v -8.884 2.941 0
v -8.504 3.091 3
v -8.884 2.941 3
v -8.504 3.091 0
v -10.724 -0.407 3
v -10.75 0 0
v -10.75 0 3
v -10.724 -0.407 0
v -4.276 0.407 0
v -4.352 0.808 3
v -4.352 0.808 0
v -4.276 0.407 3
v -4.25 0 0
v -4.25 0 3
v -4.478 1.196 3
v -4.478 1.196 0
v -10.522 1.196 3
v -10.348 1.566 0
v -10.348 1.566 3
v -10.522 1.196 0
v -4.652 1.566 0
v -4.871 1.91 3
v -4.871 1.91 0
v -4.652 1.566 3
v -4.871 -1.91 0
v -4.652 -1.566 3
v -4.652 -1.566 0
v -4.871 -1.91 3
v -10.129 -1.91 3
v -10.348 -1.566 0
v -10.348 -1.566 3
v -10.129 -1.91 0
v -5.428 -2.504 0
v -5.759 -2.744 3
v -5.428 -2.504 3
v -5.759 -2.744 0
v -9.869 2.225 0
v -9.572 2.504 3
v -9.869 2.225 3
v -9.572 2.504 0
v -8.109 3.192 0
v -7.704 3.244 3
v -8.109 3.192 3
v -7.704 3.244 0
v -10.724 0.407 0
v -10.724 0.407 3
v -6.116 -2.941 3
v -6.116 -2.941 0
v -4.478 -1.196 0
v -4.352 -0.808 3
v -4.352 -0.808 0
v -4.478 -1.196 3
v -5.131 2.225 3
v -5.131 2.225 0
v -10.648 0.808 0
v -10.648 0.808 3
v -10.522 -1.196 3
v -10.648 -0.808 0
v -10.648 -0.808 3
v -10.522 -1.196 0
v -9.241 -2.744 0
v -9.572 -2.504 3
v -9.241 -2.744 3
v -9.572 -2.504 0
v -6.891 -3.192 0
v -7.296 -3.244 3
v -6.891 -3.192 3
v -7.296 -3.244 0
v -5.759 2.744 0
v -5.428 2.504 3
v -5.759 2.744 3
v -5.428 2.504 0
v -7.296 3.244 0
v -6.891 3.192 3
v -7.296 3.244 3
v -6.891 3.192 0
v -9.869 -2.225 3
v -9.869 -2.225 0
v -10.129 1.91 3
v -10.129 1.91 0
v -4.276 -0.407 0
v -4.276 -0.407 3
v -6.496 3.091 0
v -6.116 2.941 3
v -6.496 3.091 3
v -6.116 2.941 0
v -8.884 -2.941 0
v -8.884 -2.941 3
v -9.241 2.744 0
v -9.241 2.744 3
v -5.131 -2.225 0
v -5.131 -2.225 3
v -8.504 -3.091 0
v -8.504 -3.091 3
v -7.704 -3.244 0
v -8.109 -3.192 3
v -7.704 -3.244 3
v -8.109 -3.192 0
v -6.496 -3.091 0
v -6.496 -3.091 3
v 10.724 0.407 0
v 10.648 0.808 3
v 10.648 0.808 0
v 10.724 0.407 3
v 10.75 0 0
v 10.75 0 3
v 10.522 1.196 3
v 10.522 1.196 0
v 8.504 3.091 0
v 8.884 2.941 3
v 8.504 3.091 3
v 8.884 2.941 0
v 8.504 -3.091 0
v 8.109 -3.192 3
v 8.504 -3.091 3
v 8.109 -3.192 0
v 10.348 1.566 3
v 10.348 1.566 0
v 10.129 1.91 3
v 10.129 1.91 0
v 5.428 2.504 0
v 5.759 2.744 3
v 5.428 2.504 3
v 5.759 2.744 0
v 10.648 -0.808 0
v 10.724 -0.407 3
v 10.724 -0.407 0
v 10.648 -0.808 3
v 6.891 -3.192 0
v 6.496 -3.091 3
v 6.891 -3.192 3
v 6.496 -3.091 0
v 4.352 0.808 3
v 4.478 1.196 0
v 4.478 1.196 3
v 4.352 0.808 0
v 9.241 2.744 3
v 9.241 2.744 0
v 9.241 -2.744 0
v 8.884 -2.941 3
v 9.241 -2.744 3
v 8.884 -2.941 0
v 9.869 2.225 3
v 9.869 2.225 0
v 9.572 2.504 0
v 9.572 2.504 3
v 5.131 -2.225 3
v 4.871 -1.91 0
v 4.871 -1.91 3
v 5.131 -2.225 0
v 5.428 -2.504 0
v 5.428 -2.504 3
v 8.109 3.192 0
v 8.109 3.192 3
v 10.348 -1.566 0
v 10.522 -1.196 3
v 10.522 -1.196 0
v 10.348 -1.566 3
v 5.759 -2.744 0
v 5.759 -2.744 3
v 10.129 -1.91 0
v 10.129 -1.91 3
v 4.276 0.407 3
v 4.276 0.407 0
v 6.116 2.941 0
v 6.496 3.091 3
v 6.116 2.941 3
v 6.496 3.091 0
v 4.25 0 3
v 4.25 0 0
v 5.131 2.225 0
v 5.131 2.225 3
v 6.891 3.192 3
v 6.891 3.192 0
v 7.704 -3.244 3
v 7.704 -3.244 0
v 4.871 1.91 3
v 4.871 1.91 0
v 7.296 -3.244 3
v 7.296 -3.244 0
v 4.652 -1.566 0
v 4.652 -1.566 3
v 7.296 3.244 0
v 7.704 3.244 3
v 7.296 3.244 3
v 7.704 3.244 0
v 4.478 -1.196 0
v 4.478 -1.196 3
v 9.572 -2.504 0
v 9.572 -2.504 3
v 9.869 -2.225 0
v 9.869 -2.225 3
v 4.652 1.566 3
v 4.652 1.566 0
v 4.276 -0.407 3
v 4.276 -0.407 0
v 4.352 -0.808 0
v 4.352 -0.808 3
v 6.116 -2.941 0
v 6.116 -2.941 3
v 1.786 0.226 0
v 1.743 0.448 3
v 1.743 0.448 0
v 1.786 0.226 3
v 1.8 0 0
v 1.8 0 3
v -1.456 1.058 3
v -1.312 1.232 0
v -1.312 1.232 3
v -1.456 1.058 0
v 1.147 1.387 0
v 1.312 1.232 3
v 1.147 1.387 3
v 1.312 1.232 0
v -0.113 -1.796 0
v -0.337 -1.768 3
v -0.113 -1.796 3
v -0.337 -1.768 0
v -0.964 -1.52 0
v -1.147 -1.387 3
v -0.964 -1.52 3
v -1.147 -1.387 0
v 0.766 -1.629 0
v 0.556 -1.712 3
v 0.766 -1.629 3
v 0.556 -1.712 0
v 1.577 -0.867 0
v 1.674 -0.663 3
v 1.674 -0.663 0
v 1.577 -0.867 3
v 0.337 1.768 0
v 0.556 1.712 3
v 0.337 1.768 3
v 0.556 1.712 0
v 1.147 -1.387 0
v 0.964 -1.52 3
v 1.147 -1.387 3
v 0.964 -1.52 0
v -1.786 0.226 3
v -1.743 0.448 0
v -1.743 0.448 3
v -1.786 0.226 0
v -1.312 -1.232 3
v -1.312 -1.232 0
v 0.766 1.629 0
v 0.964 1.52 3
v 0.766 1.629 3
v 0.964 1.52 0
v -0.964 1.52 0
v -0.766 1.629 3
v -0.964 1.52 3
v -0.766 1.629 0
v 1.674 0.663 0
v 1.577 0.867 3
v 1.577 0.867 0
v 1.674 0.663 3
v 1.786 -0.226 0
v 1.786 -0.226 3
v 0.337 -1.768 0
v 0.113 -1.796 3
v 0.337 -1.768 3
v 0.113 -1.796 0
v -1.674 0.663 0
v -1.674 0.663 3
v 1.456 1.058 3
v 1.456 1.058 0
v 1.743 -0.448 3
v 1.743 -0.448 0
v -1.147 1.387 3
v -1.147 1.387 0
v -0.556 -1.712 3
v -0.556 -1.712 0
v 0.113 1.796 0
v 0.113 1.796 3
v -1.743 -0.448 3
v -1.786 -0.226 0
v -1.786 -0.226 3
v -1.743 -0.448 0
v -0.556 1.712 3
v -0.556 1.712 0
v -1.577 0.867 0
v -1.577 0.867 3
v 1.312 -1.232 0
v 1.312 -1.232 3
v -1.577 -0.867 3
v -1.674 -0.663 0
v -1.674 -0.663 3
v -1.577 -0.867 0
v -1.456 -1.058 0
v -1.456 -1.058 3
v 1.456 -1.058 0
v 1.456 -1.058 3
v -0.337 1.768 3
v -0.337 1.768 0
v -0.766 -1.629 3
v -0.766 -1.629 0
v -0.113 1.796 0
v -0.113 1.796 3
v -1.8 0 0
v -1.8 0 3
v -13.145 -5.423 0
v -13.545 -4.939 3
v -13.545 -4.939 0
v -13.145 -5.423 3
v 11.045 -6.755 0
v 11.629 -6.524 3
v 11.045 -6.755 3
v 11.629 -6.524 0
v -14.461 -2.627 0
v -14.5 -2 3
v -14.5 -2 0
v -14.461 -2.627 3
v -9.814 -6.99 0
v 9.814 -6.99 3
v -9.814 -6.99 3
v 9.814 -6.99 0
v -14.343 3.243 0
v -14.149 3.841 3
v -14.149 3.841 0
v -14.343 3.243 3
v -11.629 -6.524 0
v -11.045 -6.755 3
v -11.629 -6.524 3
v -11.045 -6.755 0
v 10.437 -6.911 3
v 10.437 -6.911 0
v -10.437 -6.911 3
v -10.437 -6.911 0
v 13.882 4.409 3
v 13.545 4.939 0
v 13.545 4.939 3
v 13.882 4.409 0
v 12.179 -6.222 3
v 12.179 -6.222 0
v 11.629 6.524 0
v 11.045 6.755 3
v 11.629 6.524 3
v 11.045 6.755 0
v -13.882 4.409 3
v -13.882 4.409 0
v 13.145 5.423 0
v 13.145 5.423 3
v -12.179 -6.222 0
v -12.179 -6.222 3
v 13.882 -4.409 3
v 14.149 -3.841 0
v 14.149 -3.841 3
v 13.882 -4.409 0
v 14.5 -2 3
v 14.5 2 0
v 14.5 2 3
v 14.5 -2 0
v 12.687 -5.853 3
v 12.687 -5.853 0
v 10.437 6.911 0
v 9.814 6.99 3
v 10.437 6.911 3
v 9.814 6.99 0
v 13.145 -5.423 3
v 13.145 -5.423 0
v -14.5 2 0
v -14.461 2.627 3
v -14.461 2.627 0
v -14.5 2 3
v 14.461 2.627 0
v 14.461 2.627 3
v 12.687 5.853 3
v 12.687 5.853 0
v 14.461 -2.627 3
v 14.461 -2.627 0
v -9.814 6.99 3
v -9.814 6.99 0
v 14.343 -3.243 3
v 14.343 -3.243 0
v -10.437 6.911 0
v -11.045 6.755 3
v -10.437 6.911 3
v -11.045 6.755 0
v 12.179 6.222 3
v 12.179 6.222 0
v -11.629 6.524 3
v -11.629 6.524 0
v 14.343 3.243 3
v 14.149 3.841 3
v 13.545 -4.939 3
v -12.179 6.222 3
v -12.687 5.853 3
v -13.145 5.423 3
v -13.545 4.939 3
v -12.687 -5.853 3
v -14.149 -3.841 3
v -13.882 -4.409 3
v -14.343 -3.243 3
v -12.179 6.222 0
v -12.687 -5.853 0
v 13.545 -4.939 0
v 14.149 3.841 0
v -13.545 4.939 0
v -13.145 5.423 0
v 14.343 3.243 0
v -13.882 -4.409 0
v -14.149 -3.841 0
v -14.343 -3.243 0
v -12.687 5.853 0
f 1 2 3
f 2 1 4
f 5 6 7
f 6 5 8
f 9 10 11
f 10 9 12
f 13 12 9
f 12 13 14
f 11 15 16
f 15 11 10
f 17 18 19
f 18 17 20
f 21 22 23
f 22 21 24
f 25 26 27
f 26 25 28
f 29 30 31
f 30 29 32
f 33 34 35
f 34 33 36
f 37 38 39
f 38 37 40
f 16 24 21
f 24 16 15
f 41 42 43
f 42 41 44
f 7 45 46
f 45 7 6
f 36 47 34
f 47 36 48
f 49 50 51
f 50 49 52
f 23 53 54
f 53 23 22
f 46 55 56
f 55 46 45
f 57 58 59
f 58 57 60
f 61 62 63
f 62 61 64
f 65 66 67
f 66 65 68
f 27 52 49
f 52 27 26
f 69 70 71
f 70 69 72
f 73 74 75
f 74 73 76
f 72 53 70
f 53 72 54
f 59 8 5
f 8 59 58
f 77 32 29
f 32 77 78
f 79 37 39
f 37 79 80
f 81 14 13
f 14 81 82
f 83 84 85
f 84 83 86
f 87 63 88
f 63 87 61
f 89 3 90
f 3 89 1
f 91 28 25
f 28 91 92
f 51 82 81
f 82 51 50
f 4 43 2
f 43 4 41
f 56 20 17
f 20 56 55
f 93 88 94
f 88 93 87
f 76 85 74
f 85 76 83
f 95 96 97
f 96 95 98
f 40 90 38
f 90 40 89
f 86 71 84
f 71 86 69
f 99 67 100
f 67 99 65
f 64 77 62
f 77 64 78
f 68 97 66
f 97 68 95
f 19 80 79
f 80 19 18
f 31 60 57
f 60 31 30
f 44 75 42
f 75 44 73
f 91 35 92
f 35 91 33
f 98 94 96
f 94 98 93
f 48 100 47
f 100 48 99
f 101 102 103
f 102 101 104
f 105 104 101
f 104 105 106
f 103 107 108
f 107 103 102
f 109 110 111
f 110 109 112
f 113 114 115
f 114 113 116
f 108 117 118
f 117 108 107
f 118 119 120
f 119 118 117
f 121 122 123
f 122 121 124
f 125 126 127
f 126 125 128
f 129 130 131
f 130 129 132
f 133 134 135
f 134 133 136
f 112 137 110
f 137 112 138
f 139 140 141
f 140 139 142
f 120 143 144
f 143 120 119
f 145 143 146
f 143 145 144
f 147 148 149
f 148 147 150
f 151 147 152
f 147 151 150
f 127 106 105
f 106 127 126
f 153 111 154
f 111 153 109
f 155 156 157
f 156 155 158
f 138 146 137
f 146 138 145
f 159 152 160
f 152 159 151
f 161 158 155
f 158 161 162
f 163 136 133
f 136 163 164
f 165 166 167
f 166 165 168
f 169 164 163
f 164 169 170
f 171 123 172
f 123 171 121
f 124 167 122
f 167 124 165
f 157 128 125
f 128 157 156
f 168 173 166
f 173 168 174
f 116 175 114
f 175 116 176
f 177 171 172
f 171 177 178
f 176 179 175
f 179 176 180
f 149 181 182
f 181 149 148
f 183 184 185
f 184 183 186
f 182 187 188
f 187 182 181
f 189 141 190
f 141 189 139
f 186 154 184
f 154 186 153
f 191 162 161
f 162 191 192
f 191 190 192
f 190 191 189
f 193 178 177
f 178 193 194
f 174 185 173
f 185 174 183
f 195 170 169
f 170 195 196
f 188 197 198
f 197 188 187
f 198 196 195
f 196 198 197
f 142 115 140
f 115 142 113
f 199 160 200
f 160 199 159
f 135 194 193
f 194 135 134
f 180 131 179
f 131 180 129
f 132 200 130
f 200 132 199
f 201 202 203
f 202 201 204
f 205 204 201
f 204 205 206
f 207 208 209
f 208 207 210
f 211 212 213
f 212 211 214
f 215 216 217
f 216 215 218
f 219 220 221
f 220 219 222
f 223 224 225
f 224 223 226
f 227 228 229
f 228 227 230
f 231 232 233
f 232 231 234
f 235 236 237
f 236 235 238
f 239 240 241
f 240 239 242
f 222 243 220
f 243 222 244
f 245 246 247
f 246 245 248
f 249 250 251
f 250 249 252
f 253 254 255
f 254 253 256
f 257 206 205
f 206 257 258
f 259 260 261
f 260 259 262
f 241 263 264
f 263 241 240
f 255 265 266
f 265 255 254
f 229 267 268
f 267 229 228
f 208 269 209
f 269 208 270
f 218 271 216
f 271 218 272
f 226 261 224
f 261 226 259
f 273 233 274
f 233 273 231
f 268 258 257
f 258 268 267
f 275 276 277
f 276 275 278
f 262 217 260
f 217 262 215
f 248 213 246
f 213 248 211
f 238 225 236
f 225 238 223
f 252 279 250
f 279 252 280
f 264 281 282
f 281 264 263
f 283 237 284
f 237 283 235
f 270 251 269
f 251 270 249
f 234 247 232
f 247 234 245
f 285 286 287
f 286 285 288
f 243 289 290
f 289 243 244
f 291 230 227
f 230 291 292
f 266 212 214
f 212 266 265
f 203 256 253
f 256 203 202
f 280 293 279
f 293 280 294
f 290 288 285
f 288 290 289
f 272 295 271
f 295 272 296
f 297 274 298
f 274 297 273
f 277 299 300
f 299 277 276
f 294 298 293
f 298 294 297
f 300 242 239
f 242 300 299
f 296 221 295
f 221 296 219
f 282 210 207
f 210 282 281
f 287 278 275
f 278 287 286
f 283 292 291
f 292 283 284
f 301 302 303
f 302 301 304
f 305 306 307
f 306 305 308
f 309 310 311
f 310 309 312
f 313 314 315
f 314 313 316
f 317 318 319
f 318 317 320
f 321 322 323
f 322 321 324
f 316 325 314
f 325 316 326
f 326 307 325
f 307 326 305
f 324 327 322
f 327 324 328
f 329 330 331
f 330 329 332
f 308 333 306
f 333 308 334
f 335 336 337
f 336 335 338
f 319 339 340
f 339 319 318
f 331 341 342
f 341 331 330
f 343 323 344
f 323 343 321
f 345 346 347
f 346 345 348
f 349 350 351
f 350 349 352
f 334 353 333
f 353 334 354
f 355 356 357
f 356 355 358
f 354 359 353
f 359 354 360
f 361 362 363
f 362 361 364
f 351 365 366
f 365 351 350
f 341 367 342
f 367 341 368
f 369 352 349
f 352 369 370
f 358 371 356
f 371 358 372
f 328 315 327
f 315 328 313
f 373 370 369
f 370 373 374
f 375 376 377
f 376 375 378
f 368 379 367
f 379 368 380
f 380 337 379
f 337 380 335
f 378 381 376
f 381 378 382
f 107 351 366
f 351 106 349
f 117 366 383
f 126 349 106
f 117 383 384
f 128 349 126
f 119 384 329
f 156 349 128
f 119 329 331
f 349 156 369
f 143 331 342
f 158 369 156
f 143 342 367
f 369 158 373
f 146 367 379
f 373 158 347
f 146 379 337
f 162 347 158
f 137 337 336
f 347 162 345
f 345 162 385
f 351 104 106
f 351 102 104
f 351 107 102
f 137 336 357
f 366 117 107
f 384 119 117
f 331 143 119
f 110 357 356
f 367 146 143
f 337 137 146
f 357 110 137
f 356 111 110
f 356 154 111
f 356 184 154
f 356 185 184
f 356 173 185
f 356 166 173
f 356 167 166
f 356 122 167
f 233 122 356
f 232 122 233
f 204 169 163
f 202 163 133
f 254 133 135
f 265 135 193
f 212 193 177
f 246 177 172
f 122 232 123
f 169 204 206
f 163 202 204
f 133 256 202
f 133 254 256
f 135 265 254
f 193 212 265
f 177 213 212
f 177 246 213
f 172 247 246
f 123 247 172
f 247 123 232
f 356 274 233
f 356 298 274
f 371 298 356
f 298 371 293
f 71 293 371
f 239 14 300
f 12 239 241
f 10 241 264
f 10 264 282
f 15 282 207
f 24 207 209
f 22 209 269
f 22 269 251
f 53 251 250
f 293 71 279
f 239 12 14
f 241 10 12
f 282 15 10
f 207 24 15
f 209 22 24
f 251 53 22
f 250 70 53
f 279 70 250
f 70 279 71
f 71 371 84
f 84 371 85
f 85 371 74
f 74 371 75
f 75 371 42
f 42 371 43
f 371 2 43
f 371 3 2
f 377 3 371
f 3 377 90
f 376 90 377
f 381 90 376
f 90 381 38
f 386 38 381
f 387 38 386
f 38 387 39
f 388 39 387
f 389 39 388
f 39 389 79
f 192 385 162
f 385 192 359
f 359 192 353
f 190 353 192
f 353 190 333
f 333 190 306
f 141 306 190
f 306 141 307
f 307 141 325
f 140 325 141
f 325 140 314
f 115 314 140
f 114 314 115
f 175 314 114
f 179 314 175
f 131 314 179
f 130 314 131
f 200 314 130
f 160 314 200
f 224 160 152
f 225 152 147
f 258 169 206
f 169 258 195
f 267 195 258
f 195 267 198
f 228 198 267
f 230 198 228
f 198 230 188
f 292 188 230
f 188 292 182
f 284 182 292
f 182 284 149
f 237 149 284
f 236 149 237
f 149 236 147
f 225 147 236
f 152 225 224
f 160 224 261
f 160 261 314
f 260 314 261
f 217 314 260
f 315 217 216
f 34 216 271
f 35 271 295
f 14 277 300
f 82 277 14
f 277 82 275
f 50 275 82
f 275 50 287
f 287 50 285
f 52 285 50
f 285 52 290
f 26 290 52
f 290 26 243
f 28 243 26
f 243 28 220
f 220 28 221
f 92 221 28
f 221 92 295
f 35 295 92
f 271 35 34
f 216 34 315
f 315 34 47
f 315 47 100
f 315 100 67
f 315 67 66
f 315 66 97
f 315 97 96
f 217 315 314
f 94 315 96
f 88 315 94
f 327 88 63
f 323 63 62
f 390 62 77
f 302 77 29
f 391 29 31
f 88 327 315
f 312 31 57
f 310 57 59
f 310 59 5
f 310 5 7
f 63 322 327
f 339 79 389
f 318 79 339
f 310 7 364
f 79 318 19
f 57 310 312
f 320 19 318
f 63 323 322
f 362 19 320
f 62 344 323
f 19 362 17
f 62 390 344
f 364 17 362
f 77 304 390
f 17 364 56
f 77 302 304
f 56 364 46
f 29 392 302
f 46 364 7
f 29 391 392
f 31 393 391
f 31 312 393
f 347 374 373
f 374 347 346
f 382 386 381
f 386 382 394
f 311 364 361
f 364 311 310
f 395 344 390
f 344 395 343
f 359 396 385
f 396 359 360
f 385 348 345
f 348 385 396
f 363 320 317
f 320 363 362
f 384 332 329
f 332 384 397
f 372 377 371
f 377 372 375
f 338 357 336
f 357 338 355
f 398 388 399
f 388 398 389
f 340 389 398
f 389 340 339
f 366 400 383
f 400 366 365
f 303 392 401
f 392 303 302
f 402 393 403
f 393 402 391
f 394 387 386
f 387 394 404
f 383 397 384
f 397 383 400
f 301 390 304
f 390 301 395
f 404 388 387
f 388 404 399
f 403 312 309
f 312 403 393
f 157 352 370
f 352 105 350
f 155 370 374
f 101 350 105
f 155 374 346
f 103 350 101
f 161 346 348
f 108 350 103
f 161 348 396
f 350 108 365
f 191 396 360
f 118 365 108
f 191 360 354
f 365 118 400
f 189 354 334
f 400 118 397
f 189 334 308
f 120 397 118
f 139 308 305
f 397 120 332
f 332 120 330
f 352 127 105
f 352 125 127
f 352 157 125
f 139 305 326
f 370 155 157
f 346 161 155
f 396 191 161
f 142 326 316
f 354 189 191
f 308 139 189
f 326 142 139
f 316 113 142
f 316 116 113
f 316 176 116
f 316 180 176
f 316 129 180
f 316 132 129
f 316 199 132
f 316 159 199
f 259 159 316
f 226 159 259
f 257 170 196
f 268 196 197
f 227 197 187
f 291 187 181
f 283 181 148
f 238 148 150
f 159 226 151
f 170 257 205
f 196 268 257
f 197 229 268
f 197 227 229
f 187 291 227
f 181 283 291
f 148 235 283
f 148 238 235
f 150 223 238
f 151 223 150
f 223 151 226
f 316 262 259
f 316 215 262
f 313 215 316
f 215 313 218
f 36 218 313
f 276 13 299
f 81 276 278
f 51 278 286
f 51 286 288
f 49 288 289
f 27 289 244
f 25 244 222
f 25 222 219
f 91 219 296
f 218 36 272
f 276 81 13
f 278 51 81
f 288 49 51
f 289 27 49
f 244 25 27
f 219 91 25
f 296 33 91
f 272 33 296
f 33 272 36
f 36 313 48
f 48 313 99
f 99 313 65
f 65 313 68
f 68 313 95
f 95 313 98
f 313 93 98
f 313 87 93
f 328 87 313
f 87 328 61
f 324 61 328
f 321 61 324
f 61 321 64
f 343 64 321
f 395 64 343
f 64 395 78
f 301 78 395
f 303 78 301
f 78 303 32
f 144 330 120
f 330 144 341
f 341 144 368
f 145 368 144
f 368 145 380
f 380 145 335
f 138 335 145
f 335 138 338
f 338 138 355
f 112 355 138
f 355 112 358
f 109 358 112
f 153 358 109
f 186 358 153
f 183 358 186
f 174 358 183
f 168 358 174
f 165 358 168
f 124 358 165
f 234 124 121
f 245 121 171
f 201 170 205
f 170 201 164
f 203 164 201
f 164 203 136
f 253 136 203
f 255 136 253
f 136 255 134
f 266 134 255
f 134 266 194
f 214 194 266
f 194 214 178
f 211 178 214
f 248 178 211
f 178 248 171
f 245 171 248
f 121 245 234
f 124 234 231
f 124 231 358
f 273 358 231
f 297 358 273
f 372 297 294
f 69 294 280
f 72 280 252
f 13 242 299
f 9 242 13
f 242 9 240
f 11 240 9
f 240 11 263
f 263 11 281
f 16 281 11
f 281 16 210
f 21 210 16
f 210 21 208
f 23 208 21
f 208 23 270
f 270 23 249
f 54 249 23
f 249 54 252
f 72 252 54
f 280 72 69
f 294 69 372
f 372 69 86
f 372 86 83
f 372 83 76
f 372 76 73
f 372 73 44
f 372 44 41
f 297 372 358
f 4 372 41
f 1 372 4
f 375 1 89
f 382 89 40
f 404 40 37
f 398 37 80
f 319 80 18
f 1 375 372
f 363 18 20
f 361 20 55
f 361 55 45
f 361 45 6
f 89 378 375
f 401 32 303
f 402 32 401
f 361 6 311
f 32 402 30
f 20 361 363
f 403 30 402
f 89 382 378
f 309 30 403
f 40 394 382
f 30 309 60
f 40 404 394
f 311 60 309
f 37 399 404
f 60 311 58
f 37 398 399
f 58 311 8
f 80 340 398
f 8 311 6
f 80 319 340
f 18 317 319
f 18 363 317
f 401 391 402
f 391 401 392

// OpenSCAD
$fn = 50;


difference() {
	union() {
		*color(alpha = 1.0000000000, c = "gray") {
			translate(v = [0, 7, 0]) {
				linear_extrude(height = 1) {
					text(font = "Arial:style=Bold", halign = "center", size = 4.5000000000, text = "COMMENT plate main", valign = "center");
				}
			}
		}
		*color(alpha = 1.0000000000, c = "gray") {
			translate(v = [0, 14, 0]) {
				linear_extrude(height = 1) {
					text(font = "Arial:style=Bold", halign = "center", size = 4.5000000000, text = "COMMENT description oobb_plate_shape_p_type_3_depth_2_width_1_height_3_thickness_true_both_holes", valign = "center");
				}
			}
		}
		hull() {
			translate(v = [-9.5000000000, 2.0000000000, 0]) {
				cylinder(h = 3, r = 5);
			}
			translate(v = [9.5000000000, 2.0000000000, 0]) {
				cylinder(h = 3, r = 5);
			}
			translate(v = [-9.5000000000, -2.0000000000, 0]) {
				cylinder(h = 3, r = 5);
			}
			translate(v = [9.5000000000, -2.0000000000, 0]) {
				cylinder(h = 3, r = 5);
			}
		}
	}
	union() {
		*color(alpha = 1.0000000000, c = "gray") {
			translate(v = [0, 7, 0]) {
				linear_extrude(height = 1) {
					text(font = "Arial:style=Bold", halign = "center", size = 4.5000000000, text = "COMMENT holes main", valign = "center");
				}
			}
		}
		*color(alpha = 1.0000000000, c = "gray") {
			translate(v = [0, 14, 0]) {
				linear_extrude(height = 1) {
					text(font = "Arial:style=Bold", halign = "center", size = 4.5000000000, text = "COMMENT description oobb_holes_shape_n_type_2_width_1_height_3_thickness_true_both_holes", valign = "center");
				}
			}
		}
		translate(v = [-7.5000000000, 0.0000000000, 0]) {
			translate(v = [0, 0, -50]) {
				cylinder(h = 100, r = 3.2500000000);
			}
		}
		translate(v = [7.5000000000, 0.0000000000, 0]) {
			translate(v = [0, 0, -50]) {
				cylinder(h = 100, r = 3.2500000000);
			}
		}
		translate(v = [-7.5000000000, 0.0000000000, 0]) {
			translate(v = [0, 0, -50]) {
				cylinder(h = 100, r = 1.8000000000);
			}
		}
		translate(v = [0, 0, -50]) {
			cylinder(h = 100, r = 1.8000000000);
		}
		translate(v = [7.5000000000, 0.0000000000, 0]) {
			translate(v = [0, 0, -50]) {
				cylinder(h = 100, r = 1.8000000000);
			}
		}
	}
}
